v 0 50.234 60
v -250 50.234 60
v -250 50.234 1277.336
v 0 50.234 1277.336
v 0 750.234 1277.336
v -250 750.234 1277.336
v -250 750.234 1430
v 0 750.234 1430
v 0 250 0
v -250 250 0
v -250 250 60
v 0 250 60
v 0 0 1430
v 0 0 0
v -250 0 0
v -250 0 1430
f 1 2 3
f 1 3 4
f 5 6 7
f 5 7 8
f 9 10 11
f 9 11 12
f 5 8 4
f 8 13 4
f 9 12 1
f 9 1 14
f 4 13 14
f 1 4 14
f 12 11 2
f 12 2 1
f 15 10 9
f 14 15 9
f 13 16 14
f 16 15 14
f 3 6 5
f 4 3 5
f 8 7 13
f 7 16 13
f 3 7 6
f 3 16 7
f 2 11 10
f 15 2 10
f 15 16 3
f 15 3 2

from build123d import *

# Parameters (mm, degrees)
SKETCH1_W           = 250
SKETCH1_H           = 250
BOSS_EXTRUDE1_DEPTH = 60
SKETCH2_W           = 250
SKETCH2_H           = 50.233662696
BOSS_EXTRUDE2_DEPTH = 1370
SKETCH3_W           = 250
SKETCH3_H           = 152.663953539
BOSS_EXTRUDE3_DEPTH = 700


with BuildPart() as part:
    # Sketch1 → Boss-Extrude1 (new body)
    with BuildSketch(Plane.XY):
        with Locations((-125, 125)):
            Rectangle(SKETCH1_W, SKETCH1_H)
    extrude(amount=BOSS_EXTRUDE1_DEPTH)

    # Sketch2 → Boss-Extrude2 (add)
    with BuildSketch(Plane.XY.offset(60)):
        with Locations((-125, 25.116831348)):
            Rectangle(SKETCH2_W, SKETCH2_H)
    extrude(amount=BOSS_EXTRUDE2_DEPTH)

    # Sketch3 → Boss-Extrude3 (add)
    with BuildSketch(Plane(origin=(0, 50.233662696, 0), x_dir=(1, 0, 0), z_dir=(0, 1, 0))):
        with Locations((-125, -1353.668023231)):
            Rectangle(SKETCH3_W, SKETCH3_H)
    extrude(amount=BOSS_EXTRUDE3_DEPTH)


solid = part.part
